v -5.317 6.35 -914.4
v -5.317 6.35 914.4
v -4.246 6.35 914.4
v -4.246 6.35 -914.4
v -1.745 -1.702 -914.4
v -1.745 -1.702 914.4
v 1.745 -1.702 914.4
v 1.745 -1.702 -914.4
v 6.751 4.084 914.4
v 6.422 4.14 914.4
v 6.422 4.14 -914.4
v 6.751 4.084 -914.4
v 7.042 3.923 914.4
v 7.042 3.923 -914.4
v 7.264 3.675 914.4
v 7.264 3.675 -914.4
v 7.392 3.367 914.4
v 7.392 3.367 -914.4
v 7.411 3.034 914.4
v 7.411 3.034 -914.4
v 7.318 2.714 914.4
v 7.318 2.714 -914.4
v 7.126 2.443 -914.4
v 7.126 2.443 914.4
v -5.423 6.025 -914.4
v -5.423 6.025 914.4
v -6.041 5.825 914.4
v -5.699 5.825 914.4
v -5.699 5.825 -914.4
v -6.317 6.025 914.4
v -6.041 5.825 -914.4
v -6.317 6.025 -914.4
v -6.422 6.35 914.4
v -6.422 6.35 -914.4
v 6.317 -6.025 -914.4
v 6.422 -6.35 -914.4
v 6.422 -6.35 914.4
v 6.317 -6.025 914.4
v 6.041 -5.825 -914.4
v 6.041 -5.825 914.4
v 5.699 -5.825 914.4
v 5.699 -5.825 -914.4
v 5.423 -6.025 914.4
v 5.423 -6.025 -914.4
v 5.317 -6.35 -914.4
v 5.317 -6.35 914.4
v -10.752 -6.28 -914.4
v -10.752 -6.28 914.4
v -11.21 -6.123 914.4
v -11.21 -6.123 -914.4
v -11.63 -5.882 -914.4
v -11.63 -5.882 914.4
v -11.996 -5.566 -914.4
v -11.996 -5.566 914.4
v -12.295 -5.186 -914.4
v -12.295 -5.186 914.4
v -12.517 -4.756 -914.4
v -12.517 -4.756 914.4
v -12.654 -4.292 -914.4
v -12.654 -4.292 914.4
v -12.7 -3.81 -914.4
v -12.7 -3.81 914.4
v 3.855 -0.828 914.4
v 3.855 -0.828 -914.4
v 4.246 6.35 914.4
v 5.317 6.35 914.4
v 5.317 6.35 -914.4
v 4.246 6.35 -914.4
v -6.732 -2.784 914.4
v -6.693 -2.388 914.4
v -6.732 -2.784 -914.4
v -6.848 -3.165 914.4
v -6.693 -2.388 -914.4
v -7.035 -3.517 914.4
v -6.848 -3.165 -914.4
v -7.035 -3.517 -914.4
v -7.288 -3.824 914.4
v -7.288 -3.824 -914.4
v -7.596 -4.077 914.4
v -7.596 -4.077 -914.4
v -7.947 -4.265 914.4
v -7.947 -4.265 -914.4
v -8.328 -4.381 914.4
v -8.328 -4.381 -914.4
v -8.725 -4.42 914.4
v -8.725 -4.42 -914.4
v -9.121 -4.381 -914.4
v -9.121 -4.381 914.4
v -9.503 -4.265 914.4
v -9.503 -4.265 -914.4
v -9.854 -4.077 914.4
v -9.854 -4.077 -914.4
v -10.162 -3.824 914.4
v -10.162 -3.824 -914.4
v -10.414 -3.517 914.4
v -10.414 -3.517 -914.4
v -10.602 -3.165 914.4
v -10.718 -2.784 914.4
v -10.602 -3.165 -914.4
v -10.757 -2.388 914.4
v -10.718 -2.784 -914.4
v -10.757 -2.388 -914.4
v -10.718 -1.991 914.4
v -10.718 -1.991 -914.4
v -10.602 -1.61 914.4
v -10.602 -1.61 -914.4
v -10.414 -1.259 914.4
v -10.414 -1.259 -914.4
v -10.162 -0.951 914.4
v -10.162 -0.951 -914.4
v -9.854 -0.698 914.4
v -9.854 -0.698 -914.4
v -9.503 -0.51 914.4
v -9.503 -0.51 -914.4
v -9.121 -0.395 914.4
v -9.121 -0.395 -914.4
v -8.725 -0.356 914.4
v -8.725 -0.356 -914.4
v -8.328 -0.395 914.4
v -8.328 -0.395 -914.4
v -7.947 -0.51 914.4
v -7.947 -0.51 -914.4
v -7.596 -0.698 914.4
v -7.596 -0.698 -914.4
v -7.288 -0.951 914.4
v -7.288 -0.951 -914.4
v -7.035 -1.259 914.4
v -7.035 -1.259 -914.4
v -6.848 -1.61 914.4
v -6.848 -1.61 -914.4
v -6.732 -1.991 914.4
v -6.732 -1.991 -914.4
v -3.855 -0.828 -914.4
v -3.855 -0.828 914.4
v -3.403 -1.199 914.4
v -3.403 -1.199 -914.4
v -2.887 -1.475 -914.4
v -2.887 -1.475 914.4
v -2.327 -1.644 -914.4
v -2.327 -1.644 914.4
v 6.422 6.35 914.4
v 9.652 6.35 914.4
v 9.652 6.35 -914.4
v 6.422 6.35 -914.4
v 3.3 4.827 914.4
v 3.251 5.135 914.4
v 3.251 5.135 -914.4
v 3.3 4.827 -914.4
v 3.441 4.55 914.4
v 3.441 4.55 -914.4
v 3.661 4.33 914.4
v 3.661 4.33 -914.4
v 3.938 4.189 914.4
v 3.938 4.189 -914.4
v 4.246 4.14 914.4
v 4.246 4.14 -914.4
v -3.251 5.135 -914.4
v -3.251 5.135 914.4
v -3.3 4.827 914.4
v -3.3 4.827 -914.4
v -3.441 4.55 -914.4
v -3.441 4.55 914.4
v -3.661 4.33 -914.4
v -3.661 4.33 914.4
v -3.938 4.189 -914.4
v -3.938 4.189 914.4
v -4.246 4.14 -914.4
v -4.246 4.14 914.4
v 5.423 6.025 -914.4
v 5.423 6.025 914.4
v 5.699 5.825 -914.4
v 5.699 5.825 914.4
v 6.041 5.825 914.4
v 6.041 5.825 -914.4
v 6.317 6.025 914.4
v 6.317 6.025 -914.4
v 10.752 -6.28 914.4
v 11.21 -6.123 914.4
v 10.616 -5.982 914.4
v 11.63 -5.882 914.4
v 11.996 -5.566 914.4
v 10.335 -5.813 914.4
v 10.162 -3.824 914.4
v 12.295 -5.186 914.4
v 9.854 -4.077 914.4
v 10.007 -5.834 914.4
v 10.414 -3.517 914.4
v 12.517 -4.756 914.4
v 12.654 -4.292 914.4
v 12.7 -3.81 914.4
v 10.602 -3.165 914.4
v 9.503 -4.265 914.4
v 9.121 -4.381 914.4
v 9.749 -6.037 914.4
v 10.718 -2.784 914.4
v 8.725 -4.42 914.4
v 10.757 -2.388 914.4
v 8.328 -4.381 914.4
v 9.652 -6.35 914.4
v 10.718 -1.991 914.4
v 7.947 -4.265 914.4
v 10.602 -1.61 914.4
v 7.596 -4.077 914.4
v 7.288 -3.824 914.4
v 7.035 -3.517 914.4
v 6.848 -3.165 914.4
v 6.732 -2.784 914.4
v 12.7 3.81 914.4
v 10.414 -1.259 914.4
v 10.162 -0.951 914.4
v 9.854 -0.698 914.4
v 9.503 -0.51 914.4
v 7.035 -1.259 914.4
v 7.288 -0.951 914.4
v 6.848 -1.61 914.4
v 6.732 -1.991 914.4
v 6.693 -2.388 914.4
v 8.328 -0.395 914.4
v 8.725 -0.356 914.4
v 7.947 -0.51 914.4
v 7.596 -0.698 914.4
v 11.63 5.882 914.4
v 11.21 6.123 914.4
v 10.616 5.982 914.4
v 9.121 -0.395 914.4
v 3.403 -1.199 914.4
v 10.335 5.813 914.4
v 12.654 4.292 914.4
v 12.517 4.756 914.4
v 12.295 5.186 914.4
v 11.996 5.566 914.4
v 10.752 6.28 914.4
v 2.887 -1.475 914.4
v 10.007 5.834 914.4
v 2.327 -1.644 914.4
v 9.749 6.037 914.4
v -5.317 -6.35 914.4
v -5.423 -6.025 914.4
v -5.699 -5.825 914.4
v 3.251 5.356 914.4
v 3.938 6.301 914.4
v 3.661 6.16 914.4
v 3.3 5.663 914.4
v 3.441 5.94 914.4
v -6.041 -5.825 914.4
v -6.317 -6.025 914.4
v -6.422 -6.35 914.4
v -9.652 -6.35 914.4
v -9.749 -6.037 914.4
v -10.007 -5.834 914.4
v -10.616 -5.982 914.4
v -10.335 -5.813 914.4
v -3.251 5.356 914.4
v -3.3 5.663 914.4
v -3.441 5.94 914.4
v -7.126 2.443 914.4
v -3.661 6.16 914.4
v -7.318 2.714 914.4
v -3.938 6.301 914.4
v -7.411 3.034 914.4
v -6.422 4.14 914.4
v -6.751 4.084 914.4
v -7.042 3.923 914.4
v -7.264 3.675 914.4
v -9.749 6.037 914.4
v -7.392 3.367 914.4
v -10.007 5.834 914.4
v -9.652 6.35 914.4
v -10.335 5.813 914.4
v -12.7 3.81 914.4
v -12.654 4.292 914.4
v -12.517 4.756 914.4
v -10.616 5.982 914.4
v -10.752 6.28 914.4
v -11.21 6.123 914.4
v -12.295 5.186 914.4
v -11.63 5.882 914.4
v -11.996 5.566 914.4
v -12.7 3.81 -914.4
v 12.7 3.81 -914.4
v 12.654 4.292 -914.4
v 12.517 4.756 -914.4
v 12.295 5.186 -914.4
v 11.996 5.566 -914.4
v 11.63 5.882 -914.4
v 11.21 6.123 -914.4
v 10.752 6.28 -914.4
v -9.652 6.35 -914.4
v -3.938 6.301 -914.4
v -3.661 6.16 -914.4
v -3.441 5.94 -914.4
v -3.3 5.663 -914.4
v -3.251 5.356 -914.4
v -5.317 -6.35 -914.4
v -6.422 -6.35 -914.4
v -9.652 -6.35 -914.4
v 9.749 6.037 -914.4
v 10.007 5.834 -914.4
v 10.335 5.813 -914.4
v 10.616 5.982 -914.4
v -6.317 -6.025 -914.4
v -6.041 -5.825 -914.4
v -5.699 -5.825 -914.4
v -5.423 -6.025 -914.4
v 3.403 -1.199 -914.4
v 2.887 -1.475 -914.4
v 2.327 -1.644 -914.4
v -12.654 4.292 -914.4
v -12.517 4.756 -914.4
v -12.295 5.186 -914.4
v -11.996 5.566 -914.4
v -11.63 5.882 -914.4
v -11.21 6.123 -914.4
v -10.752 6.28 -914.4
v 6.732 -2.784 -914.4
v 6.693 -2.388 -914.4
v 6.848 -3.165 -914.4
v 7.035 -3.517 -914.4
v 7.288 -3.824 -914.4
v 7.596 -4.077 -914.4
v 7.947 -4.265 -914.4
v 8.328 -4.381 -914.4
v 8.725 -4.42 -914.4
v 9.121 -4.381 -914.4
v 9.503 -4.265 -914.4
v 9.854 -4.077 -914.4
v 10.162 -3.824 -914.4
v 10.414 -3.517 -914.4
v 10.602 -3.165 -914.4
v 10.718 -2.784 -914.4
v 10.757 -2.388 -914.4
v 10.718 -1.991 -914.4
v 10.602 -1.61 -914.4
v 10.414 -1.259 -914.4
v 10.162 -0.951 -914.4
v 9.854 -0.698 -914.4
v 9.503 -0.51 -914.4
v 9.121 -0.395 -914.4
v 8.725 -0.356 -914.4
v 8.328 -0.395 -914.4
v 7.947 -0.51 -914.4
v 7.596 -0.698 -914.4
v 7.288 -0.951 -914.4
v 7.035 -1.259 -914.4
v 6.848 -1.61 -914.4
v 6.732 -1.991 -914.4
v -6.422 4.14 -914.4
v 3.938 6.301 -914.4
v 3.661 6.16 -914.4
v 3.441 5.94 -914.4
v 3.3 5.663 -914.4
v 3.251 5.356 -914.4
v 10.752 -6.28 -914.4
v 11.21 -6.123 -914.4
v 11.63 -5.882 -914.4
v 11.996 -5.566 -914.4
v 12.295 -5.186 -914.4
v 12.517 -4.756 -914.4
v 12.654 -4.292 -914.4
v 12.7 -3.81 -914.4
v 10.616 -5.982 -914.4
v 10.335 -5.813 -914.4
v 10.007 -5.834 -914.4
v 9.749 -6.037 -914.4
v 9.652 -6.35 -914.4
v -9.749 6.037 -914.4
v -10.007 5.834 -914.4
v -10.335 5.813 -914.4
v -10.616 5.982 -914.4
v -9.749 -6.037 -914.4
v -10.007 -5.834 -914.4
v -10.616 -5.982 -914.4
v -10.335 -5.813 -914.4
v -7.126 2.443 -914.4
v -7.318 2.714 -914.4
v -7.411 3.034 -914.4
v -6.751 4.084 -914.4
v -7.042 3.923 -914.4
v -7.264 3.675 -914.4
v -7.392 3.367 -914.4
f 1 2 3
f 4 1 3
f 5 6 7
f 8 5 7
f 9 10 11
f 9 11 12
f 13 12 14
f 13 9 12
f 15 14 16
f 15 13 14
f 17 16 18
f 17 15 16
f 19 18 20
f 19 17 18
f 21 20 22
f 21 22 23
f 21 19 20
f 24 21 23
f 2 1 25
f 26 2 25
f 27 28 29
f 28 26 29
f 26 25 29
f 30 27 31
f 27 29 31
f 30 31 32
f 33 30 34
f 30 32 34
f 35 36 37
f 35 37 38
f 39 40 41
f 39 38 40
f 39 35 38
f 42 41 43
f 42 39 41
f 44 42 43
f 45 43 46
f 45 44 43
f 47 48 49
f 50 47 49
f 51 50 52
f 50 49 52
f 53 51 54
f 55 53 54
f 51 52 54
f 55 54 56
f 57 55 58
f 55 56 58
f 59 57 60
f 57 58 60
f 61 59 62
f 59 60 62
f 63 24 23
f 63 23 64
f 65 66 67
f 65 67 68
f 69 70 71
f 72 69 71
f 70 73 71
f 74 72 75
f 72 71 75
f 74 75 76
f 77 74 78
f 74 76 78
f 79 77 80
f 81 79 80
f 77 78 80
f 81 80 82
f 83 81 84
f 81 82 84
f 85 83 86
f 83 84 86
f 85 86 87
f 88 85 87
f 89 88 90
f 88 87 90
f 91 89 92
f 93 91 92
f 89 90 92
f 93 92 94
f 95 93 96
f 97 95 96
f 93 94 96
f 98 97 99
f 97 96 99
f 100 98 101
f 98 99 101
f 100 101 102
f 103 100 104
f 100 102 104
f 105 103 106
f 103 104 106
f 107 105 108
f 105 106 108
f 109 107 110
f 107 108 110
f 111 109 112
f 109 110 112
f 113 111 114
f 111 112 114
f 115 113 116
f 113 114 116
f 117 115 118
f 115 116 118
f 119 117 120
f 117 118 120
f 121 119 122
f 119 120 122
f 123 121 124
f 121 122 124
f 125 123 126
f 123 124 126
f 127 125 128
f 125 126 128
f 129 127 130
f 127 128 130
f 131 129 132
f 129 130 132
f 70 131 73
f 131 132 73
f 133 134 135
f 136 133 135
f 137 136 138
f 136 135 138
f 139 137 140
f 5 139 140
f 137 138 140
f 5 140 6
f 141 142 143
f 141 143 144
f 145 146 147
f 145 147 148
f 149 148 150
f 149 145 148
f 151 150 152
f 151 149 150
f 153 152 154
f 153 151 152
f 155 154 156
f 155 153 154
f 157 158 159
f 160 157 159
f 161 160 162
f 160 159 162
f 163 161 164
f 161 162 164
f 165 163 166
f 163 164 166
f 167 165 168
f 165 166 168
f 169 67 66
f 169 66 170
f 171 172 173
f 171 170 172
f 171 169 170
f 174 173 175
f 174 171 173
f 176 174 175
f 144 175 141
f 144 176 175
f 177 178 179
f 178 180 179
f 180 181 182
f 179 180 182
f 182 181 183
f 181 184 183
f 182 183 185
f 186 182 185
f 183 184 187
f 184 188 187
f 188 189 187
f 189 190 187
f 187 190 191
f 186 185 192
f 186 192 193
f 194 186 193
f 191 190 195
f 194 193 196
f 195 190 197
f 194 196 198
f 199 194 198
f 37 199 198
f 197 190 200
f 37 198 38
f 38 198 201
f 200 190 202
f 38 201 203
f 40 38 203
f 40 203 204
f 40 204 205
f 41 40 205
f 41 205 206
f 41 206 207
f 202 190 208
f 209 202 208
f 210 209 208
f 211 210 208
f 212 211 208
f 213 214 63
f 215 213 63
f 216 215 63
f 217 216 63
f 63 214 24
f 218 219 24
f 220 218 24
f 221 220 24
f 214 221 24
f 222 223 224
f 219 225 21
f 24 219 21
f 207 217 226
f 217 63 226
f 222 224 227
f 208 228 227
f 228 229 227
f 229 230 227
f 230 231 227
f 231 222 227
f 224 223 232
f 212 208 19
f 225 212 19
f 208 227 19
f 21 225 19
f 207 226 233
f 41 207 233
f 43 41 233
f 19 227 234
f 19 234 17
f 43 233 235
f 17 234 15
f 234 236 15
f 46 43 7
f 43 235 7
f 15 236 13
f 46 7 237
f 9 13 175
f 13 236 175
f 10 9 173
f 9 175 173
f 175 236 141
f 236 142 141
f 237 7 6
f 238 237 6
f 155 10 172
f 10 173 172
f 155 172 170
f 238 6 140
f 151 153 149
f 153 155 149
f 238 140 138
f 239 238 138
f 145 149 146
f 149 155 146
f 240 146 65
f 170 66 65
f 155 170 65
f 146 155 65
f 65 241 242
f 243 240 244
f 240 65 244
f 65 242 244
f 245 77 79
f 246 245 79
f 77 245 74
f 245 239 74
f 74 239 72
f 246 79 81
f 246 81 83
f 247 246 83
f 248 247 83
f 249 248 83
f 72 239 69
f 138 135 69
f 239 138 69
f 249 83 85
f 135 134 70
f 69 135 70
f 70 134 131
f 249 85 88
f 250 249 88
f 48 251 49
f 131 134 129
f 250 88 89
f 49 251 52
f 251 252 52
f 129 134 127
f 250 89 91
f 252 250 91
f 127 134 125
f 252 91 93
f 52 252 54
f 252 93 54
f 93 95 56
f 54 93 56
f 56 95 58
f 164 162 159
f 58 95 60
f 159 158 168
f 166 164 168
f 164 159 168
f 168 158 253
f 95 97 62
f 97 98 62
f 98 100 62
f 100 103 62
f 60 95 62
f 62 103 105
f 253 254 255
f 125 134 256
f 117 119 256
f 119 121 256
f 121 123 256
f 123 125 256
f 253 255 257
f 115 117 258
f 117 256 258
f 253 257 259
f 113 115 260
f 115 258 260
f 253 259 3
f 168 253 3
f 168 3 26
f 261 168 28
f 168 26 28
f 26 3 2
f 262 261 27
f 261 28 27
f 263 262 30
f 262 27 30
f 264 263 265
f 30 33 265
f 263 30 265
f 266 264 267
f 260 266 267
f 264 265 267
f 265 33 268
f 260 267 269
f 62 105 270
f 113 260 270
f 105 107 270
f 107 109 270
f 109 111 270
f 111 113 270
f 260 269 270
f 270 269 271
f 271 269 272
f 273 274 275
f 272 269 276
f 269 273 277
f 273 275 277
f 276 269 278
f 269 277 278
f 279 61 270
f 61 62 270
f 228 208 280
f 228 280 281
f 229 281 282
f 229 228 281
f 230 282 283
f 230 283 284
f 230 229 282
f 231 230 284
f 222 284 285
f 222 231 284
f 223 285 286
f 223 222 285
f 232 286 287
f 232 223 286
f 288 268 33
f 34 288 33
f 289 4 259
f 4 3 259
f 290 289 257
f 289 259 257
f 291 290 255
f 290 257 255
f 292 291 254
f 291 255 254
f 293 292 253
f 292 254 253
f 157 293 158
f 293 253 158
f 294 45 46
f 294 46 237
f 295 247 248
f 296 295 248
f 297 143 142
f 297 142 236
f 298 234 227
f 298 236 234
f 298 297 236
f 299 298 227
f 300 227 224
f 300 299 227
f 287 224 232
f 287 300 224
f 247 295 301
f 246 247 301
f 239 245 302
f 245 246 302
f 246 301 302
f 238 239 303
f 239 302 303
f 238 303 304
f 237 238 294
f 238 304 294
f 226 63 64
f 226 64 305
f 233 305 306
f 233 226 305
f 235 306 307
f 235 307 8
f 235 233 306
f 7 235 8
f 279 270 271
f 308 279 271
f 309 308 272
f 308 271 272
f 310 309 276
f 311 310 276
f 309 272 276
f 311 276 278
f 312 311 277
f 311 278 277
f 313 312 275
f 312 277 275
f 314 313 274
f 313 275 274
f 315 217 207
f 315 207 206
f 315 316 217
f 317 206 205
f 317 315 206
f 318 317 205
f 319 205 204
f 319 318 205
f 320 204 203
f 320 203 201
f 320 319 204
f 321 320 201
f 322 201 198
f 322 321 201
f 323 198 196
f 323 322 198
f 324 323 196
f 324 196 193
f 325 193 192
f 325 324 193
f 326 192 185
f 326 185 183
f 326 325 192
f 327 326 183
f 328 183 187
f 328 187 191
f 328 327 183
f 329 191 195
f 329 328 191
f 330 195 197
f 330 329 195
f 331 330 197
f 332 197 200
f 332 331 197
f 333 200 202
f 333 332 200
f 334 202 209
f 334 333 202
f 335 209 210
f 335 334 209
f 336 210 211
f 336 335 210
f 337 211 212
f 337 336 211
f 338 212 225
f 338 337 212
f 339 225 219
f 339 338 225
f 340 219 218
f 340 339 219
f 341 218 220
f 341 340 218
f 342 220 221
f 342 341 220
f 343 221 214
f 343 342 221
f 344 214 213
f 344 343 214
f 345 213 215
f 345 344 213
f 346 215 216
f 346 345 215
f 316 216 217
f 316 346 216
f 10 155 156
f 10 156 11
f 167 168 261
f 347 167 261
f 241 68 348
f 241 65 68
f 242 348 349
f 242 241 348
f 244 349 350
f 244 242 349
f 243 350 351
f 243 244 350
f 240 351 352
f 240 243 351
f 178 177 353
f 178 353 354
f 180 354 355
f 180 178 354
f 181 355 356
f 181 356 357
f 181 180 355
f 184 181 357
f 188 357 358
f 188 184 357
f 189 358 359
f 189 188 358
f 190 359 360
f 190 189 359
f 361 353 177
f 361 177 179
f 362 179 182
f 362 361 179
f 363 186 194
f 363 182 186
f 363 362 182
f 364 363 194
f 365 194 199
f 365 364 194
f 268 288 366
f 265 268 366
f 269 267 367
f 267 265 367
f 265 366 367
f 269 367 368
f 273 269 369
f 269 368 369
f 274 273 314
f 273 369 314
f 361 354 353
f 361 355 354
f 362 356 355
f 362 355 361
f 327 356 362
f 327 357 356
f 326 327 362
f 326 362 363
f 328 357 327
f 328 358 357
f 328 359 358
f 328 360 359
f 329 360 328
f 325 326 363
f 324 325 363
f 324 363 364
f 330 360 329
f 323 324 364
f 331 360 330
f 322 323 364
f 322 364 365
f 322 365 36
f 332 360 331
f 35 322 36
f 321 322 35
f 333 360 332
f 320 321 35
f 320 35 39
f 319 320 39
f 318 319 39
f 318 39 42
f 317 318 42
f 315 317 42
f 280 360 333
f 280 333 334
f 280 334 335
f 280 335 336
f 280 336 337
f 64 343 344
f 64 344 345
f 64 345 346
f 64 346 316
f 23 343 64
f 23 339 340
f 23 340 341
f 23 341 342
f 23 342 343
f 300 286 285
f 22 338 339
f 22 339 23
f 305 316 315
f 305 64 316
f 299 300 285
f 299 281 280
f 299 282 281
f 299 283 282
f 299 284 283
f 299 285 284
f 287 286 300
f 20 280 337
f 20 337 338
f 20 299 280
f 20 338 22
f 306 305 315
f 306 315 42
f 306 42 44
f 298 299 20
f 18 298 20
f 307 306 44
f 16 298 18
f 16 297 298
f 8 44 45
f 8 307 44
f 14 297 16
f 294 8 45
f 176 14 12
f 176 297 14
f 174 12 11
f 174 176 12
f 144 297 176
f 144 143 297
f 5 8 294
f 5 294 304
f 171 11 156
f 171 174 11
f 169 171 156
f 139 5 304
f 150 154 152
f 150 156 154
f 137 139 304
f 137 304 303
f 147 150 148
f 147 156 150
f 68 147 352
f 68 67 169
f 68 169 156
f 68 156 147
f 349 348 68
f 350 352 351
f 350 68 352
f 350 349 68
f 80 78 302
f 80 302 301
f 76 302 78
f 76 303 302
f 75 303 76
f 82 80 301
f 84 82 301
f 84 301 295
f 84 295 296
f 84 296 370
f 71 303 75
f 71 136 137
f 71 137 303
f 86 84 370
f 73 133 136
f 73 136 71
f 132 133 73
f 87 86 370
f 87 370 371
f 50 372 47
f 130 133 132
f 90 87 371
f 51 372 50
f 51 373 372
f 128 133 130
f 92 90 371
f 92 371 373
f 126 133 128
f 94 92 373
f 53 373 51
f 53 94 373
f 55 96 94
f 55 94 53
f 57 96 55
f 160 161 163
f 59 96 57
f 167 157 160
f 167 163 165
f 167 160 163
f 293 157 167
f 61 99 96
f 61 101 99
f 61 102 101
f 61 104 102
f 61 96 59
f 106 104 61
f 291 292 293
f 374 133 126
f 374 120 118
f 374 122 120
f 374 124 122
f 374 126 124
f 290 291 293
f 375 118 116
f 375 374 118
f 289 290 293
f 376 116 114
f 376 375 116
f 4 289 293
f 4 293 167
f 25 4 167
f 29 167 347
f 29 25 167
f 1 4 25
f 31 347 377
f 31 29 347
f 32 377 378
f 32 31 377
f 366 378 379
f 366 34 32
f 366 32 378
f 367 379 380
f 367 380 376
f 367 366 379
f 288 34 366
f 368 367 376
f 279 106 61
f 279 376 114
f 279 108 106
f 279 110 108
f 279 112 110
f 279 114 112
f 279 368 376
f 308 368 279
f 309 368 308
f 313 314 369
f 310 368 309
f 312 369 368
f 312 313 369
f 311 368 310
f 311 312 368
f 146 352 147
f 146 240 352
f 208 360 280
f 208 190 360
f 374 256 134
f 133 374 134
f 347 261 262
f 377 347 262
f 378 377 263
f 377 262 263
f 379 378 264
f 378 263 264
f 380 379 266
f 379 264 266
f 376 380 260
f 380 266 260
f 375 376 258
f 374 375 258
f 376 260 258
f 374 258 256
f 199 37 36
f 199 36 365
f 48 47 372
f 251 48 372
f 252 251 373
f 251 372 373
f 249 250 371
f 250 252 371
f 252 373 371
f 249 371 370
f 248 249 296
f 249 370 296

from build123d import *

# Parameters (mm, degrees)
SKETCH3_R               = 2.032
BOSS_EXTRUDE1_DEPTH     = 914.4
CUT_EXTRUDE1_DEPTH      = 915.510236411
CUT_EXTRUDE1_DEPTH_BACK = 915.510236411
SKETCH4_R               = 0.55245


with BuildPart() as part:
    # Sketch3 → Boss-Extrude1 (new, symmetric)
    with BuildSketch(Plane.XY):
        with BuildLine():
            Line((3.2512, 5.35559), (3.2512, 5.13461))
            ThreePointArc((3.2512, 5.13461), (3.542455946, 4.431455946), (4.24561, 4.1402))
            Line((4.24561, 4.1402), (6.42239, 4.1402))
            ThreePointArc((6.42239, 4.1402), (7.341105046, 3.526334232), (7.125544054, 2.442635946))
            Line((7.125544054, 2.442635946), (3.854875946, -0.828032163))
            ThreePointArc((3.854875946, -0.828032163), (2.887046479, -1.474715138), (1.745413783, -1.7018))
            Line((1.745413783, -1.7018), (0, -1.7018))
            Line((0, -1.7018), (0, -6.35))
            Line((0, -6.35), (10.16, -6.35))
            ThreePointArc((10.16, -6.35), (11.956051224, -5.606051224), (12.7, -3.81))
            Line((12.7, -3.81), (12.7, 3.81))
            ThreePointArc((12.7, 3.81), (11.956051224, 5.606051224), (10.16, 6.35))
            Line((10.16, 6.35), (4.24561, 6.35))
            ThreePointArc((4.24561, 6.35), (3.542455946, 6.058744054), (3.2512, 5.35559))
        make_face()
        with Locations(Location((8.7249, -2.3876, 0), (0, 0, 180))):
            Circle(SKETCH3_R, mode=Mode.SUBTRACT)
    extrude(amount=BOSS_EXTRUDE1_DEPTH, both=True)

    # Sketch4 → Cut-Extrude1 (cut, two sides: drawn at the far end of the back side and taken through both)
    with BuildSketch(Plane.XY.offset(-CUT_EXTRUDE1_DEPTH_BACK)):
        with Locations((5.86994, 6.35)):
            Circle(SKETCH4_R)
        with Locations((10.20445, 6.35)):
            Circle(SKETCH4_R)
        with Locations((5.86994, -6.35)):
            Circle(SKETCH4_R)
        with Locations((10.20445, -6.35)):
            Circle(SKETCH4_R)
    extrude(amount=CUT_EXTRUDE1_DEPTH + CUT_EXTRUDE1_DEPTH_BACK, mode=Mode.SUBTRACT)

    # Mirror1: part across plane


with BuildPart() as part_1:
    add(part.part)
    add(part.part.mirror(Plane(origin=(0, 0, 0), x_dir=(0, 0, 1), z_dir=(1, 0, 0))))


solid = part_1.part
